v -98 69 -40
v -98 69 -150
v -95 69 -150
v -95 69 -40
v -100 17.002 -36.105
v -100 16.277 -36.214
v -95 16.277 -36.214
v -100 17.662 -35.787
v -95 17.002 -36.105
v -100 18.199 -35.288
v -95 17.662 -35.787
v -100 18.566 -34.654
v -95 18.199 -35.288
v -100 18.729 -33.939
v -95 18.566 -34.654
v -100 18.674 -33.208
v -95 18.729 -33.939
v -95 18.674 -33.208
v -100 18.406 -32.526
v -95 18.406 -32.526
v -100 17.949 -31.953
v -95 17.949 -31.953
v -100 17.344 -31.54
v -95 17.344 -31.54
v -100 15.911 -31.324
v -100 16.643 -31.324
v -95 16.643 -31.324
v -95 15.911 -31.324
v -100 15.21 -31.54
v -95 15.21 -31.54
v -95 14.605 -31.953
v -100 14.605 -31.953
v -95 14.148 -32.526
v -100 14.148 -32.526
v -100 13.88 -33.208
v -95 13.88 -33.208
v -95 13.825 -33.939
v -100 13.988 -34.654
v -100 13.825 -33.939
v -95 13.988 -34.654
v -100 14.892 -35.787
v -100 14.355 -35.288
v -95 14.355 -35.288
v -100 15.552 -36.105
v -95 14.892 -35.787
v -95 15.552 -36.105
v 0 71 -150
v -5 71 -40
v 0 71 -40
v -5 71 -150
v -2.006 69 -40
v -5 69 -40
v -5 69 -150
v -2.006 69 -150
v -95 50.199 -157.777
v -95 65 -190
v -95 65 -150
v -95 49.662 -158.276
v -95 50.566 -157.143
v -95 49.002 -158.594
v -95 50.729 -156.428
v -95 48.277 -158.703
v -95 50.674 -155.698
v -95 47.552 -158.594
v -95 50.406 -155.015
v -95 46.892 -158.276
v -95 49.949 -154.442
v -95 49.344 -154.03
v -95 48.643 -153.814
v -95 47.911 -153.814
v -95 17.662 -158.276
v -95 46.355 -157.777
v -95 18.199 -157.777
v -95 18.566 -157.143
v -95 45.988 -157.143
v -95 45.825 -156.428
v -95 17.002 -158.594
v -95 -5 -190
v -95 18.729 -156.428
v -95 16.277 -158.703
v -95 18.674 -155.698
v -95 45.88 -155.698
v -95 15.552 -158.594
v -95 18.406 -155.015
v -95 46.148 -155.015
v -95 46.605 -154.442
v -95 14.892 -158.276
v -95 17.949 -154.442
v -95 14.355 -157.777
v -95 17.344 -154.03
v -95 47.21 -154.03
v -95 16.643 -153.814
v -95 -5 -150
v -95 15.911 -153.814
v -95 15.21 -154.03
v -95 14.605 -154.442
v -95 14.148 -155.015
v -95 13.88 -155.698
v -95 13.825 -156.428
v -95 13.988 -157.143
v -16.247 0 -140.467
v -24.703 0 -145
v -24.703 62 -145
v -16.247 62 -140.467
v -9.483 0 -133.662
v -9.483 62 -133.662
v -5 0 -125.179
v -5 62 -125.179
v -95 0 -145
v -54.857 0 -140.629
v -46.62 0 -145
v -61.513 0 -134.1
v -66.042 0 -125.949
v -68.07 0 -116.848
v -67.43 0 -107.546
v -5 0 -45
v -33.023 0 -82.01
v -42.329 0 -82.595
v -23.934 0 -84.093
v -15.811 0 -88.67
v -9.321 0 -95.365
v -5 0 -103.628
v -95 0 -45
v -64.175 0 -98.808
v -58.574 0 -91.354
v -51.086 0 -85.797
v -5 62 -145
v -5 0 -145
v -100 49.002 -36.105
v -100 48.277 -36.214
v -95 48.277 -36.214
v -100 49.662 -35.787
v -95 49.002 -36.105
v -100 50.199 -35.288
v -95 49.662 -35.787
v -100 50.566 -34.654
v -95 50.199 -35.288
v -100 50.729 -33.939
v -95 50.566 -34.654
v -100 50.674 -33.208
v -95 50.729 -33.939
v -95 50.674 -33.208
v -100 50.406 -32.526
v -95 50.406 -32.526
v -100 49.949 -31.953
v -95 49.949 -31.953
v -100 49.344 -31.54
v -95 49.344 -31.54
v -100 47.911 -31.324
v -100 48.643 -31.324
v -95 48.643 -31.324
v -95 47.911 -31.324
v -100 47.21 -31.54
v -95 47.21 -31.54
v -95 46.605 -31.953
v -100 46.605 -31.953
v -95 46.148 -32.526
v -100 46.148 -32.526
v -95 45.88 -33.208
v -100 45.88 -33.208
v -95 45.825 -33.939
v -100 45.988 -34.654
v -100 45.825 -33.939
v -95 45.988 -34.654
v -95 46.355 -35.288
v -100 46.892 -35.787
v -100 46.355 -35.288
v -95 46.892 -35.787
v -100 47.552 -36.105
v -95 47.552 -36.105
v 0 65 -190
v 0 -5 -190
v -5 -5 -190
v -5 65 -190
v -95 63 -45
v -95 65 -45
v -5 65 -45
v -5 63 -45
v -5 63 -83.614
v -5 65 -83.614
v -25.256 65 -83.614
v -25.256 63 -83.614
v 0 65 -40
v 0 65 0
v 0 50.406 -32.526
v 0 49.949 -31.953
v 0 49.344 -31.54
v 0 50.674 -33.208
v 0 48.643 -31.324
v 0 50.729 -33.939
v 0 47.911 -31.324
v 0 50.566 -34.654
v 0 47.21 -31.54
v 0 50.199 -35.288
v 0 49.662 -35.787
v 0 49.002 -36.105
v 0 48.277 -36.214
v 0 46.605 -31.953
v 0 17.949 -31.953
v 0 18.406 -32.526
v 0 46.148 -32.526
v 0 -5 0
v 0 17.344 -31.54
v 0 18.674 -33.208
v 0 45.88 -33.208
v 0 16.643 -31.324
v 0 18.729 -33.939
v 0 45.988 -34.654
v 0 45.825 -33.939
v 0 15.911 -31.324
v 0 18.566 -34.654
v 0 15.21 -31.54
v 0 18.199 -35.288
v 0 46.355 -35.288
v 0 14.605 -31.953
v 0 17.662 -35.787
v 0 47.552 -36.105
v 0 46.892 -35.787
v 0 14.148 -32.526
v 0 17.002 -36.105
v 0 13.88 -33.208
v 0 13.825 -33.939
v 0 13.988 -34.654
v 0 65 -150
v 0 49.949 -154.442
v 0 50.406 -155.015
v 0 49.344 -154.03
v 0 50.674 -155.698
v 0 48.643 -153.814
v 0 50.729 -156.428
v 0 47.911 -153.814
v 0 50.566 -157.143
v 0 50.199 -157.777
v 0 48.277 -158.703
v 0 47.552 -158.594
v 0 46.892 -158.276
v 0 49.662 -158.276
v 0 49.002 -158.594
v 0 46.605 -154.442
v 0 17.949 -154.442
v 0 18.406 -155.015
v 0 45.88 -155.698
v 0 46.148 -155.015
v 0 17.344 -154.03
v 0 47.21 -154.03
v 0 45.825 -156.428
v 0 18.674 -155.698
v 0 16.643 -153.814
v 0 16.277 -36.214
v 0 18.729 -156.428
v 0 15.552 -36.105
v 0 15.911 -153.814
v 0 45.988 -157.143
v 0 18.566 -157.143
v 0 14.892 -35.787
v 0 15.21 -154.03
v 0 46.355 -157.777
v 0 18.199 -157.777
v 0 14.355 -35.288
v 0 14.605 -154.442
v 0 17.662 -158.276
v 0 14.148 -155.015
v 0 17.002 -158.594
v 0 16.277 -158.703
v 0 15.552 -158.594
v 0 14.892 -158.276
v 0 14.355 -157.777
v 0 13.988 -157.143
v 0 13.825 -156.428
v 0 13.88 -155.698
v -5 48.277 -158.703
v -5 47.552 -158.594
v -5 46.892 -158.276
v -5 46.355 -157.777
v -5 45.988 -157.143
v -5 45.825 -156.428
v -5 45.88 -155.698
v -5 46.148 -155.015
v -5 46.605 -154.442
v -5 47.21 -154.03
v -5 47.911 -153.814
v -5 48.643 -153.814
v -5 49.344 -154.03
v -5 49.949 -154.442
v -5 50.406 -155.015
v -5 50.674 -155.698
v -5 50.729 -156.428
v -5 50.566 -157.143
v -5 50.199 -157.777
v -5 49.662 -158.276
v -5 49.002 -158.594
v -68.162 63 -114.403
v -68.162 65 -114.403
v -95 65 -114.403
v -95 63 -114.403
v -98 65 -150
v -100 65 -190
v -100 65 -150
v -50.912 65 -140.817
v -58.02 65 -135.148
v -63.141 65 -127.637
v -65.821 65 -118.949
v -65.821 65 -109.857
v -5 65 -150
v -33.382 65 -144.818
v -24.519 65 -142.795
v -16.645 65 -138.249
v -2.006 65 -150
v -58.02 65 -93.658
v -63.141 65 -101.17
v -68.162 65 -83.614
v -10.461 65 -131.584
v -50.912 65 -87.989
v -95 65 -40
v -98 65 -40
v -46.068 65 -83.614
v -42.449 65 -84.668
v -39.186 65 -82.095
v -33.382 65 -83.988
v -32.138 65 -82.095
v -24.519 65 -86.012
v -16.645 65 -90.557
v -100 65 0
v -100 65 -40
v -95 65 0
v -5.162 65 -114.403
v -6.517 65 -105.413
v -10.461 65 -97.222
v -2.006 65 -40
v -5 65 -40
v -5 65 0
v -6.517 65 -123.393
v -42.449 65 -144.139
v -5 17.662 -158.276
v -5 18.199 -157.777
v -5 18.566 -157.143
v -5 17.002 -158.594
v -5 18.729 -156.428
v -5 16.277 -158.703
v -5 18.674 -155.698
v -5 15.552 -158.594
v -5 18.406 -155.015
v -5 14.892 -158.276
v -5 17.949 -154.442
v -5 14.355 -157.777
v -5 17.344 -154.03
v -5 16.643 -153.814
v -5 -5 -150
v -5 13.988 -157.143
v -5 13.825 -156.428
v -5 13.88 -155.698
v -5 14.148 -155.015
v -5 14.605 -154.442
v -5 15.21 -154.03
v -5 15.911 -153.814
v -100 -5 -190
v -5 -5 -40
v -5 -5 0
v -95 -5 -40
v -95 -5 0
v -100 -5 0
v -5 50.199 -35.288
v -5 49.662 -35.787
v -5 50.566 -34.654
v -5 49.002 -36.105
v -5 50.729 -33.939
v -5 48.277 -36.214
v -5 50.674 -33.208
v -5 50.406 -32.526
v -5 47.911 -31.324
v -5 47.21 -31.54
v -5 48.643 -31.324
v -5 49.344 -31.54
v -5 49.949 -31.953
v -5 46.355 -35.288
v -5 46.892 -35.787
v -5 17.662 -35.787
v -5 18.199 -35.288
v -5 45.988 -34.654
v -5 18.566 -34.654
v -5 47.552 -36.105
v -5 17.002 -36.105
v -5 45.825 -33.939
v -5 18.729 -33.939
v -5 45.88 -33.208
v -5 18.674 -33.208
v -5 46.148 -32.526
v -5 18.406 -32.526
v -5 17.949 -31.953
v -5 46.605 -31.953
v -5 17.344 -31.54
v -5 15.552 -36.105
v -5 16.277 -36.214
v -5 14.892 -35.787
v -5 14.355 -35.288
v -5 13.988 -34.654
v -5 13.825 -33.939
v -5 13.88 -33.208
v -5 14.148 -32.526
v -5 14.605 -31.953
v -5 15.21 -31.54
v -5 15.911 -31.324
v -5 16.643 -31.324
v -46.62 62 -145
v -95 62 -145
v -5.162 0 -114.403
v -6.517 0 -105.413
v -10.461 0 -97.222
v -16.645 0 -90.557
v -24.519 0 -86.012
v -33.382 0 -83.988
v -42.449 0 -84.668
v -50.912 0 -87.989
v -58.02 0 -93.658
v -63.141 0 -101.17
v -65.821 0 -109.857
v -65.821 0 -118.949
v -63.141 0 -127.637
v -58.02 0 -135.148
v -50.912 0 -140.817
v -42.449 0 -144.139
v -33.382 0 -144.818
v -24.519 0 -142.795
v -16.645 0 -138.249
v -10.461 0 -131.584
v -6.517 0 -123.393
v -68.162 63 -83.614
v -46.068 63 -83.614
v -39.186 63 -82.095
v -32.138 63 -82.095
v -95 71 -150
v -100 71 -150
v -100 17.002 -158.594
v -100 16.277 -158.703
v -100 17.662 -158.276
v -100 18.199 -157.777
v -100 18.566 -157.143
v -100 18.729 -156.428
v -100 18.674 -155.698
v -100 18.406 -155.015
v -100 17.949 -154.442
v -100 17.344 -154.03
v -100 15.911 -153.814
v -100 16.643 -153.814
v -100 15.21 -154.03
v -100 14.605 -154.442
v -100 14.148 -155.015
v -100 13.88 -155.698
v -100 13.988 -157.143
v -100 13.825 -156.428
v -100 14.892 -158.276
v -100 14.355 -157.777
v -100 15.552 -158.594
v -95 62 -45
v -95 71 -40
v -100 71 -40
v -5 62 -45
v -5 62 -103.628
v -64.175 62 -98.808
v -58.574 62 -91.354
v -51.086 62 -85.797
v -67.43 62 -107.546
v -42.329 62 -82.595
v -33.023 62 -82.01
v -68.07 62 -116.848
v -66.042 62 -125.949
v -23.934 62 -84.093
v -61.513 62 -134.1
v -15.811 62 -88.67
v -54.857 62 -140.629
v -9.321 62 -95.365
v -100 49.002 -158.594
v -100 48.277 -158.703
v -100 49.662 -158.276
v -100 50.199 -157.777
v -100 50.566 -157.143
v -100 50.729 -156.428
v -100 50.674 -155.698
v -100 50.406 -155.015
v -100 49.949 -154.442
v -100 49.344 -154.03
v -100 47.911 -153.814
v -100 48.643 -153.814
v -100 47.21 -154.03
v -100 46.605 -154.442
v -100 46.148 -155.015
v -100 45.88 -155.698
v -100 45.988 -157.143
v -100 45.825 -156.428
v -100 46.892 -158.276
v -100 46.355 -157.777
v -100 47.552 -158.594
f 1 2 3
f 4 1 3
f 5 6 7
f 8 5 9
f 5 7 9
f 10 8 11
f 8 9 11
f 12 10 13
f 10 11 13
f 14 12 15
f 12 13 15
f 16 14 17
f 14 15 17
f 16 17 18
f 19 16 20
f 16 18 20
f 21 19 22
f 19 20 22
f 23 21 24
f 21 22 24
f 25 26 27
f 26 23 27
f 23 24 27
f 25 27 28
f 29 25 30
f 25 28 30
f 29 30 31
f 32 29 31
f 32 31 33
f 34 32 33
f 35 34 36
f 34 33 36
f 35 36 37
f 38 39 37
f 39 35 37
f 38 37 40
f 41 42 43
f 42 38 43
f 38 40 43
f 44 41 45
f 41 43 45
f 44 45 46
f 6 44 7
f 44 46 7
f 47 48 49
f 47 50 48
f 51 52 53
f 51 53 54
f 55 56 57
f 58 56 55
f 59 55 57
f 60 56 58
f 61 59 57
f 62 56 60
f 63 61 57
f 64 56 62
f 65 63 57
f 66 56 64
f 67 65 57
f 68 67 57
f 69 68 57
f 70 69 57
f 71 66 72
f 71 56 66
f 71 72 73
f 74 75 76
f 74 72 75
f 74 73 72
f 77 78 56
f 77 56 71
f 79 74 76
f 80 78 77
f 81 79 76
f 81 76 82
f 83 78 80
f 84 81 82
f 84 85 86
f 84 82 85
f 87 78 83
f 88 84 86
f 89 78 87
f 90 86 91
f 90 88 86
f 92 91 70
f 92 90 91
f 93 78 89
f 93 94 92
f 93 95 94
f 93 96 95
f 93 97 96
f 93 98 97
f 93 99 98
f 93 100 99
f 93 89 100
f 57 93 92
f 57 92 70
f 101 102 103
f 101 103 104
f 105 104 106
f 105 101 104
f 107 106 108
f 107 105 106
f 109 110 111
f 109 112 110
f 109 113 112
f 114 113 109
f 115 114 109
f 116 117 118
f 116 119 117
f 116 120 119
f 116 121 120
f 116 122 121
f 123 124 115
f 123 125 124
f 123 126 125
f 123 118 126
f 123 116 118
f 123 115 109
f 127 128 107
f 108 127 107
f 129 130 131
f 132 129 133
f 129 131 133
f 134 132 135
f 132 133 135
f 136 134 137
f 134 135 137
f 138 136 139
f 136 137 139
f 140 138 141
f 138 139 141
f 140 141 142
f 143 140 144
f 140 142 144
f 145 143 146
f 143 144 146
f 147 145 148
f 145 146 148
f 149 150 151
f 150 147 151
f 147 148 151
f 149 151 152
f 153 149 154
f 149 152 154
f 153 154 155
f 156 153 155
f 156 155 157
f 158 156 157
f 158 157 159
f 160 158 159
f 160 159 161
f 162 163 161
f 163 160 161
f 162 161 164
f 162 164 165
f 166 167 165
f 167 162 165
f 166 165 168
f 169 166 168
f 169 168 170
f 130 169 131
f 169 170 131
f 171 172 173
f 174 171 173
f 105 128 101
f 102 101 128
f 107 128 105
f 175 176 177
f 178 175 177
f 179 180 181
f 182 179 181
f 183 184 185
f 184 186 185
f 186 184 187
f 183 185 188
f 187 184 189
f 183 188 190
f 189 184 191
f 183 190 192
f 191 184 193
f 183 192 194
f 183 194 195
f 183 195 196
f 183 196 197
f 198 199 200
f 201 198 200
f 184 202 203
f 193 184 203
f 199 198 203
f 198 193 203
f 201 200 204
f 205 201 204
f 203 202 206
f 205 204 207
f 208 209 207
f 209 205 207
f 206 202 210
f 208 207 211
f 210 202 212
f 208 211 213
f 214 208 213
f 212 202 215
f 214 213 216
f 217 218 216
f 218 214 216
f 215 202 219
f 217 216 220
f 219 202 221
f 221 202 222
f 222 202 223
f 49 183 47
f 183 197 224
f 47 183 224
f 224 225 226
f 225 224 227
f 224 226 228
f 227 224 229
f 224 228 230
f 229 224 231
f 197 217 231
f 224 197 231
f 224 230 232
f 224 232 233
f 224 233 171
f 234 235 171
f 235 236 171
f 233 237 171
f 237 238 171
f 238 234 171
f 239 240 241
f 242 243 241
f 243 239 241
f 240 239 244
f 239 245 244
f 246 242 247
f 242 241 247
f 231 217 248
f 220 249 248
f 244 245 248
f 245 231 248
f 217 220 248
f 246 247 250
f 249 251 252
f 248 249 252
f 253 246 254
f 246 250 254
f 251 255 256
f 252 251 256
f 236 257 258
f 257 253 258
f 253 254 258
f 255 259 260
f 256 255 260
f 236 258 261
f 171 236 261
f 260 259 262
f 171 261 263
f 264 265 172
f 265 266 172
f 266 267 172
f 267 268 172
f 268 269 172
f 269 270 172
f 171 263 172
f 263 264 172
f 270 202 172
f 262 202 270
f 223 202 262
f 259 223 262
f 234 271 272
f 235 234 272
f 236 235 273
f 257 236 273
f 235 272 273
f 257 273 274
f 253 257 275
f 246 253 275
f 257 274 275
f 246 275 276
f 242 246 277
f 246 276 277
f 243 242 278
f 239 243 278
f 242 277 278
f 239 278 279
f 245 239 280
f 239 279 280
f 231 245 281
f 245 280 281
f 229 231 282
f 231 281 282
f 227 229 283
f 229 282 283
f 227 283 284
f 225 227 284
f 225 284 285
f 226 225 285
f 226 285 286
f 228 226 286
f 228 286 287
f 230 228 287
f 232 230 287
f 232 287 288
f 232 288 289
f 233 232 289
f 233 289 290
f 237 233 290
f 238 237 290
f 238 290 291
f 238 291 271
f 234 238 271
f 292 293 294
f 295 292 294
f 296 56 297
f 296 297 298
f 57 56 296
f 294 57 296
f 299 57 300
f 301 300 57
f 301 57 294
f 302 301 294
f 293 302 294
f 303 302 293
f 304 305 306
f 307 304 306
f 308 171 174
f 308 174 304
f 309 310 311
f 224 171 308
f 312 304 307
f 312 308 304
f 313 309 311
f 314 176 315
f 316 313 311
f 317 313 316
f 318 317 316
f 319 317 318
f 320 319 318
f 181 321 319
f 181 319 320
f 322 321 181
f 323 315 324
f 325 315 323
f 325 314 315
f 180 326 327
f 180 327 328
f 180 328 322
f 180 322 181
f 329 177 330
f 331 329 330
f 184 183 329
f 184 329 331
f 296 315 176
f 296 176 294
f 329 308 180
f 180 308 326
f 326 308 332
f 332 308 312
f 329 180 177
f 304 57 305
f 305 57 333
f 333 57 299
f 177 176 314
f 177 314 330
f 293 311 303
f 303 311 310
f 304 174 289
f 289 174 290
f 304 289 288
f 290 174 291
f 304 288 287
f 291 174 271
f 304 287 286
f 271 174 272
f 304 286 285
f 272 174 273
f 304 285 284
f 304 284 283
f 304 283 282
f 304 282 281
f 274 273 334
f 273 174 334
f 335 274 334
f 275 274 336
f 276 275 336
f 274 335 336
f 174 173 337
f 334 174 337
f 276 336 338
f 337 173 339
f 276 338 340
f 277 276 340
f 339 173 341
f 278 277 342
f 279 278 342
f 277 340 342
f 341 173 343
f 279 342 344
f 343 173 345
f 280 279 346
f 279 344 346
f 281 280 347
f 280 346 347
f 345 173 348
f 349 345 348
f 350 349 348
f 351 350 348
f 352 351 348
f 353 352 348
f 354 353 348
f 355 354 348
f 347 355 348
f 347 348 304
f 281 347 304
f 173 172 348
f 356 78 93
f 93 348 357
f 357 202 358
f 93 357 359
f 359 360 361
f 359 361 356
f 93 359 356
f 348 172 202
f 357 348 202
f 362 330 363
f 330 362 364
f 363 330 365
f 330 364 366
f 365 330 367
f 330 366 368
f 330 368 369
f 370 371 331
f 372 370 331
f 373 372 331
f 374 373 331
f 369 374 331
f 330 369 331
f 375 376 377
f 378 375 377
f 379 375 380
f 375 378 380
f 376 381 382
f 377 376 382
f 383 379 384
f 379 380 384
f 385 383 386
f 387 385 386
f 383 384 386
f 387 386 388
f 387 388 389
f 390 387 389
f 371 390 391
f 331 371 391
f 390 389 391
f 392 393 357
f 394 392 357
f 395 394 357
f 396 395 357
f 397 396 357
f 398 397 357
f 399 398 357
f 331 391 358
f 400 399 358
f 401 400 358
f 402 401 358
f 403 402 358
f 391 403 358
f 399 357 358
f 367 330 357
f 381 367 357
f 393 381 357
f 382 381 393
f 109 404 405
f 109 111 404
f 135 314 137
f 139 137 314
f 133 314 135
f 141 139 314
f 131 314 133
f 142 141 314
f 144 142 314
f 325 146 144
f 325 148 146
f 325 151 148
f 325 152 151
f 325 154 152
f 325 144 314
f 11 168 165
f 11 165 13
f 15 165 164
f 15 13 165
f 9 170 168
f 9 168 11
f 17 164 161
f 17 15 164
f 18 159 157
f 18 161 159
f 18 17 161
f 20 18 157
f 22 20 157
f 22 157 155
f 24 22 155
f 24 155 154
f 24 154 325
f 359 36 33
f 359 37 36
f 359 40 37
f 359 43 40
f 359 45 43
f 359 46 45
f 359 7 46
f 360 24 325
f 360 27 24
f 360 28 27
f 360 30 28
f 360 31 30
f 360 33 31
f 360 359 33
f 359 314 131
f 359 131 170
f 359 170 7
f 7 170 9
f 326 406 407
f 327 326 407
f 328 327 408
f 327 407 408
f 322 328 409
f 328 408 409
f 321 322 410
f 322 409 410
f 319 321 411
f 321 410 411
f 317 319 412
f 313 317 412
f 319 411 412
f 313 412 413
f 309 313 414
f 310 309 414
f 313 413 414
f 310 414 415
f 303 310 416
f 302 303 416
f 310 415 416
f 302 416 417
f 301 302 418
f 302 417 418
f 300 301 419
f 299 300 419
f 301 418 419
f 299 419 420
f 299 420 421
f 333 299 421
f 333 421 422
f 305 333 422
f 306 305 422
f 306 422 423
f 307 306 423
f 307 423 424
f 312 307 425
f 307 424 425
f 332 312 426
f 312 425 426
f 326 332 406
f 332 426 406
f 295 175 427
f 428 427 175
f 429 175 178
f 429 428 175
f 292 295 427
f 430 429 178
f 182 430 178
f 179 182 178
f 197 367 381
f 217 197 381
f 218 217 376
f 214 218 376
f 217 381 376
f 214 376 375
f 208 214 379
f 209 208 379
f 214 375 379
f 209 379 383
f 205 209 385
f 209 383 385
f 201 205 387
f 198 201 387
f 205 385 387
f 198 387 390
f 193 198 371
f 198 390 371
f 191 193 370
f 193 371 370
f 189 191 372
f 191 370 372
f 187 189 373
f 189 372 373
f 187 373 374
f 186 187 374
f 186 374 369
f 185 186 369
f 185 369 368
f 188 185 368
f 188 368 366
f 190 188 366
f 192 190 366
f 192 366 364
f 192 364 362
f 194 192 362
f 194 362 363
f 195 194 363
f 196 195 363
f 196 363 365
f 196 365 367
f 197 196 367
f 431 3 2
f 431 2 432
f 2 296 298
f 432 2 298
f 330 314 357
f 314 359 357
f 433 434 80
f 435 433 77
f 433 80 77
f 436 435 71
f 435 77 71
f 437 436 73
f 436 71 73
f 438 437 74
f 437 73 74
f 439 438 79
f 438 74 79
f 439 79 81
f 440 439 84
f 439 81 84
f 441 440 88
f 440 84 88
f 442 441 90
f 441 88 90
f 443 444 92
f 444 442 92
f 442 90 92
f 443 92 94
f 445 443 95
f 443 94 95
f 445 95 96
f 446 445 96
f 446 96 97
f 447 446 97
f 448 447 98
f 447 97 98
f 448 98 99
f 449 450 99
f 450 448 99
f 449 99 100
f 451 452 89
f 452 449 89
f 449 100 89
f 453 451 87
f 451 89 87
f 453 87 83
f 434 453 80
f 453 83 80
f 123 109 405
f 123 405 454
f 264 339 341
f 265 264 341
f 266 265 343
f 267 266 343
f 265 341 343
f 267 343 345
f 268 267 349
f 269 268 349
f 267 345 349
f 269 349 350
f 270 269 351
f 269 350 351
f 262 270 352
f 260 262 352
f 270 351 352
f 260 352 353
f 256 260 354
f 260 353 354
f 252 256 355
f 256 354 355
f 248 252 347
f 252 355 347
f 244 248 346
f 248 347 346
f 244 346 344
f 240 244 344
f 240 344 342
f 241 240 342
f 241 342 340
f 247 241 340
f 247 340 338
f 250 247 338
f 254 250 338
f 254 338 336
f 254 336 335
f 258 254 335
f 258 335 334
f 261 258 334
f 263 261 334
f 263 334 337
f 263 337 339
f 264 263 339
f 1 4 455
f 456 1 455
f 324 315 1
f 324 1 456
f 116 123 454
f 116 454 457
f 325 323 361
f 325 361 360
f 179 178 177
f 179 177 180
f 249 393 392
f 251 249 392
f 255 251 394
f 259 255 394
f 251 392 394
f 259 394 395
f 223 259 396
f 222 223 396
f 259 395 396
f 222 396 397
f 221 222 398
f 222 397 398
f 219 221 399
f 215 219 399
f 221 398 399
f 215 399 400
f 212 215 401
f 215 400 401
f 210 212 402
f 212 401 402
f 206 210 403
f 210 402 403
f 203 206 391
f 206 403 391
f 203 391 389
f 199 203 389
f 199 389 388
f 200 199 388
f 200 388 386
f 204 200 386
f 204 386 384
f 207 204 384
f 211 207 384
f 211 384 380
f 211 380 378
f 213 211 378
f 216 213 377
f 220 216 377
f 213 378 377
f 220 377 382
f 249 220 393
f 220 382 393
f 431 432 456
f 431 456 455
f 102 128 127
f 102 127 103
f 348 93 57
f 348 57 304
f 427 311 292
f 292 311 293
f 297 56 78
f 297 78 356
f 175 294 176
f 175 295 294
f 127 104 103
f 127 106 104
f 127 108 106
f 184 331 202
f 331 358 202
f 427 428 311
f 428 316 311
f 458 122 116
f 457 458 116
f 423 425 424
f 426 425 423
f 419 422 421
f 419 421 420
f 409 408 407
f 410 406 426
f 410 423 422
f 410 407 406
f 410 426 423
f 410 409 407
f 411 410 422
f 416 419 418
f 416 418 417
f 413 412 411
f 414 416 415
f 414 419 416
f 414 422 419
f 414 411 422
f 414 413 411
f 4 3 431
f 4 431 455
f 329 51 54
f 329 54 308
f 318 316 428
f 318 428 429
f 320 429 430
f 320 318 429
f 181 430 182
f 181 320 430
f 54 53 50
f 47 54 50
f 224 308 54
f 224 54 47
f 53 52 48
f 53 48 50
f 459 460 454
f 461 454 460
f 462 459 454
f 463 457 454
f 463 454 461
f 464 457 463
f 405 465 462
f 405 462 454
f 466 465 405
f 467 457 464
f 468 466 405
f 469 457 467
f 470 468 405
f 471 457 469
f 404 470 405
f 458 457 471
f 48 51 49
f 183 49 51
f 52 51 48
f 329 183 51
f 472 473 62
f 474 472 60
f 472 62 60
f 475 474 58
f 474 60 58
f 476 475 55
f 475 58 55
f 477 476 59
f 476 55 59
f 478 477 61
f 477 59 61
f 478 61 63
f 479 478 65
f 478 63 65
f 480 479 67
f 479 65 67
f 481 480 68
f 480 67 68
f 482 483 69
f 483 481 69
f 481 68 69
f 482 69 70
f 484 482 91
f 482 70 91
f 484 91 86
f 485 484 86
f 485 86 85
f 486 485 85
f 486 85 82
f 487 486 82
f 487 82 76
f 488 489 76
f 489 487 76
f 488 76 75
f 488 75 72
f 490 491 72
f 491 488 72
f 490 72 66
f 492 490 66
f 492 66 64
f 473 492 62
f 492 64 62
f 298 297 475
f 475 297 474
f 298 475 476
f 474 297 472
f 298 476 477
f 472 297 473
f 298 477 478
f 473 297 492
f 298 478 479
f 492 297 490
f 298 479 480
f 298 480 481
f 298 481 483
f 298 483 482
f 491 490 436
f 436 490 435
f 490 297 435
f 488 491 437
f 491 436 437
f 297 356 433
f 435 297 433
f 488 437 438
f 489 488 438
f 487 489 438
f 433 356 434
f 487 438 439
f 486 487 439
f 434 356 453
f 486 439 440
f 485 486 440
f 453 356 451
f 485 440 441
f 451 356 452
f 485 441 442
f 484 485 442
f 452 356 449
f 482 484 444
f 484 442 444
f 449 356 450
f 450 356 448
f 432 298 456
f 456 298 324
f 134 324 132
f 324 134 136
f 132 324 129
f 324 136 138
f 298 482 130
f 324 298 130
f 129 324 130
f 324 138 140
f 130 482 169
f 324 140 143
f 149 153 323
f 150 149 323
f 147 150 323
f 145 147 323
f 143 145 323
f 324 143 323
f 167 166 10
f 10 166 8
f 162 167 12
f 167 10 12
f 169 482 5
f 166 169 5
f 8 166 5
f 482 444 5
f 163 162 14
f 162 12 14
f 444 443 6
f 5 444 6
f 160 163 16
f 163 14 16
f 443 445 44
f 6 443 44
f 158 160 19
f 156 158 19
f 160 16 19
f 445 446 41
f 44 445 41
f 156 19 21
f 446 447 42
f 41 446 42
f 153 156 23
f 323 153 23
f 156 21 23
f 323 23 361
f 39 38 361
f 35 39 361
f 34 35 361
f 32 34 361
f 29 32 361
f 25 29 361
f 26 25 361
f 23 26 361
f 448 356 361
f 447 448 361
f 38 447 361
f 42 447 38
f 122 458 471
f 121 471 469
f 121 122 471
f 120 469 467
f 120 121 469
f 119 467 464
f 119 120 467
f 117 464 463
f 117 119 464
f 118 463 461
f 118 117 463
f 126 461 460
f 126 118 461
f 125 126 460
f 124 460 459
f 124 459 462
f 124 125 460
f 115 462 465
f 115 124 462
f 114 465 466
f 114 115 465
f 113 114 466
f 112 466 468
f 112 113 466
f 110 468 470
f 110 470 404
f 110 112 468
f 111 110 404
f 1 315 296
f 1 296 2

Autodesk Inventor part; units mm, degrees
ref_plane "YZ Plane" through (0, 0, 0) normal (1, 0, 0) x (0, 1, 0)
ref_plane "XZ Plane" through (0, 0, 0) normal (0, 1, 0) x (-1, 0, 0)
ref_plane "XY Plane" through (0, 0, 0) normal (0, 0, 1) x (1, 0, 0)
sketch "Sketch1" plane through (0, 0, 0) normal (0, 1, 0) x (-1, 0, 0)
  line L0 (0, 0) -> (0, -190)
  line L1 (0, -190) -> (100, -190)
  line L2 (100, -190) -> (100, 0)
  line L3 (100, 0) -> (0, 0)
  line L4 (95, -5) -> (95, -185)
  line L5 (95, -185) -> (5, -185)
  line L6 (5, -185) -> (5, -5)
  line L7 (5, -5) -> (95, -5)
  line L8 (95, -5) -> (95, 0)
  line L9 (95, -185) -> (95, -190)
  line L10 (5, -185) -> (5, -190)
  line L11 (5, -5) -> (5, 0)
  line L12 (100, -45) -> (0, -45)
  line L13 (0, -45) -> (0, -145)
  line L14 (0, -145) -> (100, -145)
  line L15 (100, -145) -> (100, -45)
  line L16 (100, -40) -> (0, -40)
  line L17 (100, -150) -> (0, -150)
  point P0 (100, -95)
  point P1 (100, -95)
  point P2 (5, -150)
  point P3 (95, -150)
  point P4 (95, -40)
  point P5 (5, -40)
  point P6 (95, -145)
  point P7 (5, -145)
  point P8 (5, -45)
  point P9 (95, -45)
  dimension "d0" = 190
  dimension "d1" = 100
  dimension "d2" = 100
  dimension "d3" = 5
  dimension "d4" = 5
extrude "Extrusion1" add sketch "Sketch1" along normal blind 65 contours L3 L11 L6 L16 L0 | L16 L6 L12 L0 | L12 L6 L14 L0 | L3 L2 L16 L4 L8 | L14 L6 L17 L0 | L16 L2 L12 L4 | L17 L6 L10 L1 L0 | L12 L2 L14 L4 | L14 L2 L17 L4 | L17 L2 L1 L9 L4
extrude "Extrusion2" add sketch "Sketch1" against normal blind 5 contours L3 L11 L6 L16 L0 | L16 L6 L12 L0 | L12 L6 L14 L0 | L16 L4 L12 L6 | L3 L2 L16 L4 L8 | L14 L6 L17 L0 | L12 L4 L14 L6 | L16 L2 L12 L4 | L17 L6 L10 L1 L0 | L14 L4 L17 L6 | L12 L2 L14 L4 | L14 L2 L17 L4 | L17 L2 L1 L9 L4
extrude "Extrusion3" add sketch "Sketch1" along normal blind 65 contours L14 L4 L17 L6
extrude "Extrusion5" add sketch "Sketch1" along normal blind 65 contours L16 L4 L12 L6
sketch "Sketch2" plane through (0, 0, 0) normal (0, 1, 0) x (1, 0, 0)
  circle A0 centre (-35.6617, 114.4032) radius 30.5
  circle A1 centre (-35.6617, 114.4032) radius 32.5
  point P0 (0, 0)
  dimension "d11" = 61
  dimension "d12" = 65
extrude "Extrusion4" add sketch "Sketch2" along normal blind 65
sketch "Sketch3" plane through (-5, 0, -103.6278) normal (-1, 0, 0) x (0, 0, 1)
  line L0 (-41.3722, 65) -> (-21.5507, 65) projected
  line L1 (58.6278, 0) -> (58.6278, 65) projected
  line L2 (-41.3722, 65) -> (58.6278, 65)
  line L3 (58.6278, 65) -> (58.6278, 62)
  line L4 (58.6278, 62) -> (-41.3722, 62)
  line L5 (-41.3722, 62) -> (-41.3722, 65)
  point P0 (103.6278, 0)
  dimension "d17" = 3
extrude "Extrusion6" add sketch "Sketch3" along normal up to surface (90 mm away)
extrude "Extrusion7" cut sketch "Sketch2" along normal blind 66.5 contours A0
sketch "Sketch4" plane through (0, 65, 0) normal (0, 1, 0) x (1, 0, 0)
  line L0 (-95, 145) -> (-95, 45) projected
  line L1 (-5, 45) -> (-5, 103.6278) projected
  line L2 (-95, 45) -> (-5, 45)
  line L3 (-5, 45) -> (-5, 83.6142)
  line L4 (-5, 83.6142) -> (-95, 83.6142)
  line L5 (-95, 83.6142) -> (-95, 45)
  arc A0 (-46.6201, 145) -> (-5, 103.6278) centre (-35.6617, 114.4032) ccw projected
  line L6 (-95, 83.6142) -> (-68.1617, 83.6142)
  line L7 (-68.1617, 83.6142) -> (-68.1617, 114.4032)
  line L8 (-68.1617, 114.4032) -> (-95, 114.4032)
  line L9 (-95, 114.4032) -> (-95, 83.6142)
  point P0 (0, 0)
  point P1 (-25.2556, 83.6142)
  point P2 (-46.0678, 83.6142)
extrude "Extrusion8" cut sketch "Sketch4" against normal blind 2 contours L8 L7 L4 L0 | L4 A0 L1 L2 L0
sketch "Sketch5" plane through (0, 65, 0) normal (1, 0, 0) x (0, 0, -1)
  circle A0 centre (33.7554, -16.723) radius 5.5293
  circle A1 centre (33.7554, -48.723) radius 5.535
  circle A2 centre (156.2446, -16.723) radius 5.926
  circle A3 centre (156.2446, -48.723) radius 6.0534
  line L0 (33.7554, -16.723) -> (33.7554, -48.723)
  line L1 (33.7554, -16.723) -> (156.2446, -16.723)
  line L2 (0, 0) -> (190, 0) projected
  line L3 (0, -70) -> (0, 0) projected
  line L4 (0, 0) -> (190, 0)
  point P0 (0, -65)
  point P1 (95, -16.723)
  point P2 (33.7554, -32.723)
  point P3 (95, 0)
  dimension "d24" = 16.723
  dimension "d25" = 32
hole "Hole1" at (0, 48.277, -33.7554) at (0, 16.277, -33.7554) at (0, 16.277, -156.2446) at (0, 48.277, -156.2446) direction (-1, 0, 0) diameter 4.917 depth 17.1 thread size "M6x1" class "6H" standard "ANSI Metric M Profile"
ref_plane "Work Plane1" through (-50, 65, 0) normal (1, 0, 0) x (0, 0, -1)
mirror "Mirror1" about plane through (-50, 65, 0) normal (1, 0, 0) of "Hole1"
sketch "Sketch6" plane through (0, 65, 0) normal (0, 1, 0) x (1, 0, 0)
  line L0 (-95, 150) -> (-95, 190) projected
  line L1 (-95, 150) -> (-100, 150)
  line L2 (-100, 190) -> (-100, 0) projected
  line L3 (-95, 40) -> (-5, 40) projected
  line L4 (-95, 40) -> (-100, 40)
  line L5 (-100, 150) -> (-95, 150)
  line L6 (-95, 150) -> (-95, 40)
  line L7 (-95, 40) -> (-100, 40)
  line L8 (-100, 40) -> (-100, 150)
  line L9 (0, 0) -> (0, 190) projected
  line L10 (-5, 150) -> (0, 150)
  line L11 (0, 150) -> (0, 40)
  line L12 (0, 40) -> (-5, 40)
  line L13 (-5, 40) -> (-5, 150)
extrude "Extrusion9" add sketch "Sketch6" along normal blind 6
sketch "Sketch7" plane through (-100, 65, -40) normal (0, 0, 1) x (1, 0, 0)
  line L0 (5, 0) -> (5, 6) projected
  line L1 (5, 4) -> (5, 0)
  line L2 (5, 0) -> (2, 0)
  line L3 (2, 0) -> (2, 4)
  line L4 (2, 4) -> (5, 4)
  line L5 (94.9938, 4) -> (97.9938, 4)
  line L6 (97.9938, 4) -> (97.9938, 0)
  line L7 (97.9938, 0) -> (94.9938, 0)
  line L8 (94.9938, 0) -> (94.9938, 4)
  line L9 (5, 0) -> (5, 6) projected
  line L10 (0, 0) -> (5, 0) projected
  line L11 (95, 0) -> (100, 0) projected
  point P0 (100, -65)
  dimension "d35" = 4
  dimension "d36" = 3
  dimension "d37" = 3
  dimension "d38" = 4
  dimension "d39" = 0
  dimension "d40" = 0
extrude "Extrusion10" cut sketch "Sketch7" against normal up to surface (110 mm away)
properties part number "MiddlePart"
